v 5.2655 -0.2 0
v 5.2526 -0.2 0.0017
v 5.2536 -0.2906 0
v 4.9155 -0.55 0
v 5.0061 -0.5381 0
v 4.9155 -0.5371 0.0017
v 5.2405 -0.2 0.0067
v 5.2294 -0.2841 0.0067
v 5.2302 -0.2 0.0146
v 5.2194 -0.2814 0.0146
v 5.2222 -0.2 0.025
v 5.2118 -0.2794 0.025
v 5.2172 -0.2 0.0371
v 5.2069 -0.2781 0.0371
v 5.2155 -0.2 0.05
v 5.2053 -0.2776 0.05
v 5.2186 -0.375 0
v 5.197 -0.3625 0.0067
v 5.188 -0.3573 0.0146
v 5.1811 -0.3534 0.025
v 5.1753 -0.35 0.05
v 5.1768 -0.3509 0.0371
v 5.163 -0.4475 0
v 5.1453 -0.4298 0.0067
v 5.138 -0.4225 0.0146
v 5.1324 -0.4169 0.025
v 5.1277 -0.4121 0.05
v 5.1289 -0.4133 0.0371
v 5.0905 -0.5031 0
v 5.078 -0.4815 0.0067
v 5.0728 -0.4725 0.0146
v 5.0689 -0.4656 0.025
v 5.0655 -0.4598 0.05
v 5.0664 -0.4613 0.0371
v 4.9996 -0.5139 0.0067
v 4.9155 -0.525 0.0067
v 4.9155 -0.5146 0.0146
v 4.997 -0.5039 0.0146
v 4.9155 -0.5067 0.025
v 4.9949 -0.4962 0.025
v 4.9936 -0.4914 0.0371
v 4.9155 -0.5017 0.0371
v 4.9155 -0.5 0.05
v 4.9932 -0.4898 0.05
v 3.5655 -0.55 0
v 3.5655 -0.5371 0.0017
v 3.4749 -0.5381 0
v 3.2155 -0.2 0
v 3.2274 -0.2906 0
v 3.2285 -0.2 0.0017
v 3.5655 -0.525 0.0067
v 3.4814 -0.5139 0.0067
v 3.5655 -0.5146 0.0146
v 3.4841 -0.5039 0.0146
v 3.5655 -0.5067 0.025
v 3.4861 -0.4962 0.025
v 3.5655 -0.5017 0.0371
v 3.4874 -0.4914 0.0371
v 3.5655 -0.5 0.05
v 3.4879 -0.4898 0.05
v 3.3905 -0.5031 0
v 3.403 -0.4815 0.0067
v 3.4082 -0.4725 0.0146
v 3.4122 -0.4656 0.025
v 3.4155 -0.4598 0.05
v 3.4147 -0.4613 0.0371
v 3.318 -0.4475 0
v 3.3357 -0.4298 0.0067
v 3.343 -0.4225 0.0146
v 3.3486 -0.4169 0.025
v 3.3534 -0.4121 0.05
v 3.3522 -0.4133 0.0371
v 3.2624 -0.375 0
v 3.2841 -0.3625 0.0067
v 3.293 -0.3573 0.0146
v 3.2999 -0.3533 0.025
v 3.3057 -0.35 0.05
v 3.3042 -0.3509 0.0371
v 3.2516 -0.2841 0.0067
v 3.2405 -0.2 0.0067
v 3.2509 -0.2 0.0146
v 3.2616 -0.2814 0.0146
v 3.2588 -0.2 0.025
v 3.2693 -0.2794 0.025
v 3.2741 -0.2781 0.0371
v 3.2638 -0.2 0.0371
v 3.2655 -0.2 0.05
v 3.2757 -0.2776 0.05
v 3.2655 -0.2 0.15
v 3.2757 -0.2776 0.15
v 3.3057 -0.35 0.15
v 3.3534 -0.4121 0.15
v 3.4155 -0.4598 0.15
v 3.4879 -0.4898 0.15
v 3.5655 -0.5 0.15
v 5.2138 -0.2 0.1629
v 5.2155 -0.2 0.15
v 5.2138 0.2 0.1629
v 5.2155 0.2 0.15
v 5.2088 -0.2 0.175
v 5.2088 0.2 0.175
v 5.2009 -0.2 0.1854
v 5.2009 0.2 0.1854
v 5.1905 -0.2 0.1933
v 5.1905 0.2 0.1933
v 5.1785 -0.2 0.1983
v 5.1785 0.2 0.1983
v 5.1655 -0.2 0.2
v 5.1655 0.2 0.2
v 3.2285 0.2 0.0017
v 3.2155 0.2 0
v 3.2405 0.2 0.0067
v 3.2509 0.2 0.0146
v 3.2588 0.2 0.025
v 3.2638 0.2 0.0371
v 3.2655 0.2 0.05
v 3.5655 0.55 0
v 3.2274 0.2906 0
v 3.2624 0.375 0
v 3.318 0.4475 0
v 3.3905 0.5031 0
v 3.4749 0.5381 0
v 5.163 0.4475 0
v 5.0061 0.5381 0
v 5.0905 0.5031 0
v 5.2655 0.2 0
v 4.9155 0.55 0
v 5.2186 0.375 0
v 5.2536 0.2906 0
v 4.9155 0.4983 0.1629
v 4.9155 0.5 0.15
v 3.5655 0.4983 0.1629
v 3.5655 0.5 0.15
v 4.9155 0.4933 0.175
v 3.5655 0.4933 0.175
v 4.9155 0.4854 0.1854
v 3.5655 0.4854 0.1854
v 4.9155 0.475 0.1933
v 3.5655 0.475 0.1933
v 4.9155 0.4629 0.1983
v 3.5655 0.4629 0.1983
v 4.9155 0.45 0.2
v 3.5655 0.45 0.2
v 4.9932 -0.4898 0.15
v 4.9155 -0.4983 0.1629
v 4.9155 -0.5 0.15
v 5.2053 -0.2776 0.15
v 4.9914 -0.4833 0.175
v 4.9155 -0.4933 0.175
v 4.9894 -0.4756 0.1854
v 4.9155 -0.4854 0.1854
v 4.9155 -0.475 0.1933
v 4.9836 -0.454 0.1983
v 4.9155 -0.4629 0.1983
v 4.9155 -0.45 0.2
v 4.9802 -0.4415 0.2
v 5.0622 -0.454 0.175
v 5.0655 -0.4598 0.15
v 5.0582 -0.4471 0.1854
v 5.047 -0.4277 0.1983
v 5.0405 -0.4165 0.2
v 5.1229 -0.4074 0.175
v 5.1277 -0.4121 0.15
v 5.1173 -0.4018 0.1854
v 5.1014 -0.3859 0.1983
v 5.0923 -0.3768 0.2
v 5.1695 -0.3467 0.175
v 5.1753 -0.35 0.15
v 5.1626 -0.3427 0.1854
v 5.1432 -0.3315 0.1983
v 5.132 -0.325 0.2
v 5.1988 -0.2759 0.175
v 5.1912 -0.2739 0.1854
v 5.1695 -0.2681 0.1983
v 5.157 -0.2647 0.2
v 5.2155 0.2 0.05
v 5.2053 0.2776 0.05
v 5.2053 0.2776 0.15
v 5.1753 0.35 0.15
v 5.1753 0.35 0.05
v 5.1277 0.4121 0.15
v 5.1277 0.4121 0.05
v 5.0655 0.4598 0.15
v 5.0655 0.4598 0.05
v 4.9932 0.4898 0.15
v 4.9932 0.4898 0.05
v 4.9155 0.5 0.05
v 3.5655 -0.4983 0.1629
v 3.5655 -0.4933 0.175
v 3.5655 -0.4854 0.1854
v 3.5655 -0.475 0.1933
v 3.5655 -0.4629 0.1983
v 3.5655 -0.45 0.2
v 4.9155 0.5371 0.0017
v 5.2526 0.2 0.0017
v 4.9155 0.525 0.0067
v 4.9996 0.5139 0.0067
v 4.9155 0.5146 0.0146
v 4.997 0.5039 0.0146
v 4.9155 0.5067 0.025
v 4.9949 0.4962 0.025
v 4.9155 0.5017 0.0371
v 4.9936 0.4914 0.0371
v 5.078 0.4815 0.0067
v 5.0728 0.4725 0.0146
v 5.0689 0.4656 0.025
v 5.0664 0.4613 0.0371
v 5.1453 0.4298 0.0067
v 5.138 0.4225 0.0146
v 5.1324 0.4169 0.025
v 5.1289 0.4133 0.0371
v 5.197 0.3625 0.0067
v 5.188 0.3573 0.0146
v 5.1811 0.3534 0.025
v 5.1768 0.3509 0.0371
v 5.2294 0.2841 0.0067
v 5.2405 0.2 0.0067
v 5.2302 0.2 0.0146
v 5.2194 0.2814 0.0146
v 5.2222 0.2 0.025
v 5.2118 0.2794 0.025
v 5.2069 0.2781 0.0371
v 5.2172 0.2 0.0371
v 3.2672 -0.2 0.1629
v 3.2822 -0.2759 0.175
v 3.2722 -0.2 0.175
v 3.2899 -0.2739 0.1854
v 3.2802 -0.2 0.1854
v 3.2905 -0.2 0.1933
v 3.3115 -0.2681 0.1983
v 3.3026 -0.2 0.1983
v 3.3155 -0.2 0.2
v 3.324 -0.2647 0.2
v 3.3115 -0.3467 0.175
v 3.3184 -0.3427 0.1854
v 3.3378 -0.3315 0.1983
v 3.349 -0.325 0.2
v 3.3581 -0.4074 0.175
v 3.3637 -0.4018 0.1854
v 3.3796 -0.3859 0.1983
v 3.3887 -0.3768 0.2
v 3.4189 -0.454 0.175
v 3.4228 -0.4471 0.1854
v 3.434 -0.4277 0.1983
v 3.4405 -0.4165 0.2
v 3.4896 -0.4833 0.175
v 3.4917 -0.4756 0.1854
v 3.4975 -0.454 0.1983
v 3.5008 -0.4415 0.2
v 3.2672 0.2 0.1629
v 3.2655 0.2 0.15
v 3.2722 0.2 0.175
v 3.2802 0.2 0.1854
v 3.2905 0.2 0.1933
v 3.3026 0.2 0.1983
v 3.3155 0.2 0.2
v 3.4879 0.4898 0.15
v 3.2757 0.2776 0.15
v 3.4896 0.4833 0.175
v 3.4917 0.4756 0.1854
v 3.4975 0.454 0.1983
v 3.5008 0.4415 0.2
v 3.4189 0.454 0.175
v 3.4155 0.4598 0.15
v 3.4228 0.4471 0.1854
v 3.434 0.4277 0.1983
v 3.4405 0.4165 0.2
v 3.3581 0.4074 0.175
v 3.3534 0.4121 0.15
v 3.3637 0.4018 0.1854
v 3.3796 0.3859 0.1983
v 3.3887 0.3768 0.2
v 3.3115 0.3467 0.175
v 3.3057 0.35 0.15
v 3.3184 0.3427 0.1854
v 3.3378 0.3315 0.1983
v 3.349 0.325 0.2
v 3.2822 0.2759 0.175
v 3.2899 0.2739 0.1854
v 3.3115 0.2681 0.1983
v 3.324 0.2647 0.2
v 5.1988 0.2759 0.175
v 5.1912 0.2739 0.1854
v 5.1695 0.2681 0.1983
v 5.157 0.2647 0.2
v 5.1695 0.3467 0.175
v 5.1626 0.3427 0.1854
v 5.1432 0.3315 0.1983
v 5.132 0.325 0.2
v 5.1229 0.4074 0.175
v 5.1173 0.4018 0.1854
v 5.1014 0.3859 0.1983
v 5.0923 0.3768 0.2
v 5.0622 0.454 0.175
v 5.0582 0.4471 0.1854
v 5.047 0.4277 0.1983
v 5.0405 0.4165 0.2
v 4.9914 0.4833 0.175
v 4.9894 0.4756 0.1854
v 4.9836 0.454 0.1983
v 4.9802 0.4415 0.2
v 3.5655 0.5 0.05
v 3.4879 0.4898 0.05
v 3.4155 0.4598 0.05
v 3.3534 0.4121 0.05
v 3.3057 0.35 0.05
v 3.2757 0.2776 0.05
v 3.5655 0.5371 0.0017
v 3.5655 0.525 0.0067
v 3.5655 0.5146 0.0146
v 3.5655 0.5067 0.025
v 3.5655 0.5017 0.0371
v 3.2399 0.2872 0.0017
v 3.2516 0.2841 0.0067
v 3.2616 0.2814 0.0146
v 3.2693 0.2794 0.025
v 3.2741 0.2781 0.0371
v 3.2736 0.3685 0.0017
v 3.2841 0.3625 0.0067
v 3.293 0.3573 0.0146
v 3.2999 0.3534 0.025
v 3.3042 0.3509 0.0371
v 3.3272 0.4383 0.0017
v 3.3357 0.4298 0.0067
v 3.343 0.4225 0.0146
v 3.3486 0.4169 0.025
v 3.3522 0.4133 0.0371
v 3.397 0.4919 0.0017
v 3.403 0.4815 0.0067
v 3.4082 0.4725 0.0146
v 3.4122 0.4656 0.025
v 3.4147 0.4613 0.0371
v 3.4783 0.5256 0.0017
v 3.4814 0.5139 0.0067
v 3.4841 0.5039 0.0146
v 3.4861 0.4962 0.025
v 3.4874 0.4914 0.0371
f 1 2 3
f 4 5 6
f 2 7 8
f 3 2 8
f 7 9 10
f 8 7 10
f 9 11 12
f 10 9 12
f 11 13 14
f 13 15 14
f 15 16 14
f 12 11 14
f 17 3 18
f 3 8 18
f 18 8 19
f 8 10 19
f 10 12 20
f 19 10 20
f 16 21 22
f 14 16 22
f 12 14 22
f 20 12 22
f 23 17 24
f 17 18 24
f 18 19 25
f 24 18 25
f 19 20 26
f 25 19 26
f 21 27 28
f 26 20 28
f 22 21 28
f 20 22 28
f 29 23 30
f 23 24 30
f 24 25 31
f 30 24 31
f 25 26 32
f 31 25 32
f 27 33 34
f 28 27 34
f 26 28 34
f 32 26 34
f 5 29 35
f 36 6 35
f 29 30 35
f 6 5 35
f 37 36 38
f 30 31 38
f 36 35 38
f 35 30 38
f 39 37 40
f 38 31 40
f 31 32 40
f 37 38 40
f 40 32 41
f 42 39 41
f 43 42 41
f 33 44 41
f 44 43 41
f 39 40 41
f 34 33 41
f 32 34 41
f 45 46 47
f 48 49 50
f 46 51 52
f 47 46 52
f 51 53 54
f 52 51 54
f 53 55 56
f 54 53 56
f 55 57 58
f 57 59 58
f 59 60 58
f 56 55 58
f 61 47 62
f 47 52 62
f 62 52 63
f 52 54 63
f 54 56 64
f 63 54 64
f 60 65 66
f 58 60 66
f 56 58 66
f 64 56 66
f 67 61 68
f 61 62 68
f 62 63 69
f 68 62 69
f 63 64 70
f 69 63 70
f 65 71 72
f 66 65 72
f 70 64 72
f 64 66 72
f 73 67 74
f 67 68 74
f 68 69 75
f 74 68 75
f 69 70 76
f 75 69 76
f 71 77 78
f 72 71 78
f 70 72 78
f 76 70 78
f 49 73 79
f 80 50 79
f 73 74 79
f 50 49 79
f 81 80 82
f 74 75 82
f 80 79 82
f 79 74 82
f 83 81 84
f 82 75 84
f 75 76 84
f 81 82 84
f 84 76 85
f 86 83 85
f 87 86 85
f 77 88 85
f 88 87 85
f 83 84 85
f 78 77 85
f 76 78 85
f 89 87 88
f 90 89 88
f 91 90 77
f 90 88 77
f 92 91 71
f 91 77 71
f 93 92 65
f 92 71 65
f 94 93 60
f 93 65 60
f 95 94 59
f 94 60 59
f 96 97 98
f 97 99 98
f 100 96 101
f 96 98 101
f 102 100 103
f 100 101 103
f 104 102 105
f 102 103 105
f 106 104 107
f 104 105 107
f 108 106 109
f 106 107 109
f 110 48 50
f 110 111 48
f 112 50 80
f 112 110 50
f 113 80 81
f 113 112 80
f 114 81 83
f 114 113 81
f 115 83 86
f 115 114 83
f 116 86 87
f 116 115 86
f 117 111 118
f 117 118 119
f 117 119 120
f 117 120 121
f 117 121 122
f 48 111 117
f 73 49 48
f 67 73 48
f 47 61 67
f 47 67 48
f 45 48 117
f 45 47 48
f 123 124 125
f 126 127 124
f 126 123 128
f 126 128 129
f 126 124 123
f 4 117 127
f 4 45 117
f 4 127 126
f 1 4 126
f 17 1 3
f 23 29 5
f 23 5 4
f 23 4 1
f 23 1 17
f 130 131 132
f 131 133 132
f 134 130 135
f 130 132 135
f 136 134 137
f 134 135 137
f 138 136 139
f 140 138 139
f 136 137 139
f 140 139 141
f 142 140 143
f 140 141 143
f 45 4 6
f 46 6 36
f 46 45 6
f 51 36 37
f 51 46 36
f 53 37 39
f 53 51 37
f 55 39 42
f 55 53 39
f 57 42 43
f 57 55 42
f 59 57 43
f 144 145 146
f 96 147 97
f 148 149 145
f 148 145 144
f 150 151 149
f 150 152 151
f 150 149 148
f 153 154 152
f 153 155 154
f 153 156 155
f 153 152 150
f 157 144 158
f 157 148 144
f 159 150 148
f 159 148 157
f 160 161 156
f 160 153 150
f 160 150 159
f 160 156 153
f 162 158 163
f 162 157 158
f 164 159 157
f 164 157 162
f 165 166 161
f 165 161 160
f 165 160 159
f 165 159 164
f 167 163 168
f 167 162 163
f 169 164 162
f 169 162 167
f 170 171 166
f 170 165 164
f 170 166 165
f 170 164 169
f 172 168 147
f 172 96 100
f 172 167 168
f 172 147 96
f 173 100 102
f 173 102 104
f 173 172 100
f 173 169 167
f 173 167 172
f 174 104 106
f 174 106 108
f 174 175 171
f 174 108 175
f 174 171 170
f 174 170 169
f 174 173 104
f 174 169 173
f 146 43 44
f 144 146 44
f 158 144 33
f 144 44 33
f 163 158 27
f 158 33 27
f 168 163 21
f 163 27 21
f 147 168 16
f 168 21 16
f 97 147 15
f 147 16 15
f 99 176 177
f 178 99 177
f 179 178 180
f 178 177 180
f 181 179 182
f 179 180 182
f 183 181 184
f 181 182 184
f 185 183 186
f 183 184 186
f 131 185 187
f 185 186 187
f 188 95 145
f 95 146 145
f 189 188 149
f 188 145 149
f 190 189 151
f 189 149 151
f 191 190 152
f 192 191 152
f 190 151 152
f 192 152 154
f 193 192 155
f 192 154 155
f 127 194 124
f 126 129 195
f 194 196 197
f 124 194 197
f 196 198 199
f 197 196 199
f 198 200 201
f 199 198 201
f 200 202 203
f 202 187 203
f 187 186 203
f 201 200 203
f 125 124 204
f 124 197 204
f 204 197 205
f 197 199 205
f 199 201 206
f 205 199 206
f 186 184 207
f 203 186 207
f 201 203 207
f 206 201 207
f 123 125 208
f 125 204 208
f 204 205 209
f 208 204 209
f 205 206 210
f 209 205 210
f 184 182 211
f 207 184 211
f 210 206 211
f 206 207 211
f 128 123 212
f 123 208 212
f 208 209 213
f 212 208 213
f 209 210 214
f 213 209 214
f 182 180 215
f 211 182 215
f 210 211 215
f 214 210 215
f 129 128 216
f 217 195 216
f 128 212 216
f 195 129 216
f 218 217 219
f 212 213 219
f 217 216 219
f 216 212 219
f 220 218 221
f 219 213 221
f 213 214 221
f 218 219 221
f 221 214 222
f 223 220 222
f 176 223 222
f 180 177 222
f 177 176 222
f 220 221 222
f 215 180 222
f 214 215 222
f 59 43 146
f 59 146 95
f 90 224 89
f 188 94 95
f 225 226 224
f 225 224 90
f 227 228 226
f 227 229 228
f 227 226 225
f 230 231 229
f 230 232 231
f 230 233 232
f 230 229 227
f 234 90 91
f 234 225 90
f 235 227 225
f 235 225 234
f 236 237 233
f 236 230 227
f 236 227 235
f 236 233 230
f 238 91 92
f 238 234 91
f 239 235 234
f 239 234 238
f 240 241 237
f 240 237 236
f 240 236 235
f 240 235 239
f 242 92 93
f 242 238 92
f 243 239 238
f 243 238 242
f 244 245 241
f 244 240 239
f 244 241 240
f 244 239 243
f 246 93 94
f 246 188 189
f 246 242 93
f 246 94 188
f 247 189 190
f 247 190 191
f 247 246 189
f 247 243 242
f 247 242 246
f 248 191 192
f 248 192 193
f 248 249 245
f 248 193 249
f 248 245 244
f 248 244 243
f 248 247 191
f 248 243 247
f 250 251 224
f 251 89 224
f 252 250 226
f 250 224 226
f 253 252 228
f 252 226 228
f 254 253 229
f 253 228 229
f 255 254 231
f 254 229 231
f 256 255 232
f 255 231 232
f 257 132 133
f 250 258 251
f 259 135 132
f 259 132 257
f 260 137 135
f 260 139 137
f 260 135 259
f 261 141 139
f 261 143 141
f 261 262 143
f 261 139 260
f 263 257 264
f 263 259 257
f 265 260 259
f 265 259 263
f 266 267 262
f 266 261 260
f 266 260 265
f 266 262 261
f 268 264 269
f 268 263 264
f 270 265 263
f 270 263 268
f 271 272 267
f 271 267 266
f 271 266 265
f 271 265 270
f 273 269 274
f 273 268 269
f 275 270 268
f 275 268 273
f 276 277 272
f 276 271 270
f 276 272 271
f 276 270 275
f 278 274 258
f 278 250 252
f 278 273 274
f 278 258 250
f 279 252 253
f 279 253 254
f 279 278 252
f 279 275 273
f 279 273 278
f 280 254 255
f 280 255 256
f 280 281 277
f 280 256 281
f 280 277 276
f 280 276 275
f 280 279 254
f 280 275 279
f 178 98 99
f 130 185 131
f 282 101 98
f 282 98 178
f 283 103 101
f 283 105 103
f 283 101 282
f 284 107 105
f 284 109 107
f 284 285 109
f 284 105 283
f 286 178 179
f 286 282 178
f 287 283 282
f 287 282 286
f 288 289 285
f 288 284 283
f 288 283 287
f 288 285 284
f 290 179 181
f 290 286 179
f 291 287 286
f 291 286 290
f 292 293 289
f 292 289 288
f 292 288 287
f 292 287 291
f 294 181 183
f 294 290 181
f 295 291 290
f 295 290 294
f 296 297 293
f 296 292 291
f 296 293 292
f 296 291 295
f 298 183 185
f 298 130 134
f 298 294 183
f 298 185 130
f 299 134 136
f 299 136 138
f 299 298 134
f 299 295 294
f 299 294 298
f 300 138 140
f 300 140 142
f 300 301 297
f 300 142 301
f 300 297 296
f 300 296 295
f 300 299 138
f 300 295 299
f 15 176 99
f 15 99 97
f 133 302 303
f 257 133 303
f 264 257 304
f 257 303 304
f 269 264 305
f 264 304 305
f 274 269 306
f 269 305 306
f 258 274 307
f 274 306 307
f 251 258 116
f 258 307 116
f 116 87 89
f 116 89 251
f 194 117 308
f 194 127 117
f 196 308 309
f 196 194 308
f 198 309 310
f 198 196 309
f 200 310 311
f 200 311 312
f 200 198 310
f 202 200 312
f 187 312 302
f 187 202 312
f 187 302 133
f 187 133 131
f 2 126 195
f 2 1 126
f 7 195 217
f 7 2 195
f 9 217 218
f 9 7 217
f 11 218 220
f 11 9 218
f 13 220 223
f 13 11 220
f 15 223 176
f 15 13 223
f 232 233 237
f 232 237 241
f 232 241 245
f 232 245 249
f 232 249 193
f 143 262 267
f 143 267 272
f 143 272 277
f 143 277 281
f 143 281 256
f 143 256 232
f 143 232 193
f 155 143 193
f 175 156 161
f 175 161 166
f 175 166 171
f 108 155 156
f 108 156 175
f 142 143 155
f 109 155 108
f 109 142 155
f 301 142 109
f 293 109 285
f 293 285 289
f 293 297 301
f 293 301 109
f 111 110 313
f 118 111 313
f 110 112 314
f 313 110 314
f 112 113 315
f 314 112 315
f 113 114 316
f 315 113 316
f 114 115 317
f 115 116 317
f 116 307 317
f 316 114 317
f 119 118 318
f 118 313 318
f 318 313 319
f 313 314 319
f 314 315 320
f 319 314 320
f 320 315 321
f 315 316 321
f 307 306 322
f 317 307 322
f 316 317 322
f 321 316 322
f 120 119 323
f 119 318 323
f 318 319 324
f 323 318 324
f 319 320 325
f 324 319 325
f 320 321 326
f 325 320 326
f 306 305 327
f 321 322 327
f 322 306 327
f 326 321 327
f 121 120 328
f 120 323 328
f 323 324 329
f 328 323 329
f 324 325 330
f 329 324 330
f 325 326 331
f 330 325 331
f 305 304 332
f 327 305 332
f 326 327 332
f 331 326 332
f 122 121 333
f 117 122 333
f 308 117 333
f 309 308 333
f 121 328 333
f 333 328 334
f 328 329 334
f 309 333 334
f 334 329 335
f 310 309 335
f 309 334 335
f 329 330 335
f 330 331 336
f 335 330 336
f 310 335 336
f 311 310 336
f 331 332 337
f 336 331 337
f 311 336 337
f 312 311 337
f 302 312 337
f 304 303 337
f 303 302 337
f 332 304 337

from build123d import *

# Parameters (mm, degrees)
PAD_DEPTH    = 0.2
FILLET_R     = 0.05
SKETCH001_W  = 2.303536
SKETCH001_H  = 1.406875
PAD001_DEPTH = 0.01
FILLET001_R  = 0.05
SKETCH002_W  = 2.303536
SKETCH002_H  = 1.406875
POCKET_DEPTH = 0.01


with BuildPart() as part:
    # Sketch → Pad (new body)
    with BuildSketch(Plane.XY):
        with BuildLine():
            ThreePointArc((3.565519, 0.5), (3.353385, 0.412133), (3.265516, 0.2))
            Line((3.265516, -0.2), (3.265516, 0.2))
            ThreePointArc((3.265516, -0.2), (3.353384, -0.412132), (3.565516, -0.5))
            Line((4.915516, -0.5), (3.565516, -0.5))
            ThreePointArc((4.915516, -0.5), (5.127652, -0.412134), (5.215522, -0.2))
            Line((5.215522, 0.2), (5.215522, -0.2))
            ThreePointArc((5.215522, 0.2), (5.127653, 0.412133), (4.915519, 0.5))
            Line((3.565519, 0.5), (4.915519, 0.5))
        make_face()
    extrude(amount=PAD_DEPTH)

    # Fillet
    fillet_edges = [part.edges().sort_by_distance(p)[0] for p in [
        (3.353385, 0.412133, 0.2),
        (3.265516, 0, 0.2),
        (3.353384, -0.412132, 0.2),
        (4.240516, -0.5, 0.2),
        (5.127652, -0.412134, 0.2),
        (5.215522, 0, 0.2),
        (5.127653, 0.412133, 0.2),
        (4.240519, 0.5, 0.2),
    ]]
    fillet(fillet_edges, radius=FILLET_R)

    # Sketch001 (on Face4 of Fillet) → Pad001 (join)
    with BuildSketch(Plane(origin=(0, 0, 0), x_dir=(1, 0, 0), z_dir=(0, 0, -1))):
        with Locations((4.283474, -0.074854)):
            Rectangle(SKETCH001_W, SKETCH001_H)
    extrude(amount=PAD001_DEPTH)

    # Fillet001
    fillet001_edges = [part.edges().sort_by_distance(p)[0] for p in [
        (4.240519, 0.5, 0),
    ]]
    fillet(fillet001_edges, radius=FILLET001_R)

    # Sketch002 (on Face31 of Fillet001) → Pocket (cut)
    with BuildSketch(Plane(origin=(0, 0, -0.01), x_dir=(1, 0, 0), z_dir=(0, 0, -1))):
        with Locations((4.283474, -0.074854)):
            Rectangle(SKETCH002_W, SKETCH002_H)
    extrude(amount=-POCKET_DEPTH, mode=Mode.SUBTRACT)


solid = part.part
